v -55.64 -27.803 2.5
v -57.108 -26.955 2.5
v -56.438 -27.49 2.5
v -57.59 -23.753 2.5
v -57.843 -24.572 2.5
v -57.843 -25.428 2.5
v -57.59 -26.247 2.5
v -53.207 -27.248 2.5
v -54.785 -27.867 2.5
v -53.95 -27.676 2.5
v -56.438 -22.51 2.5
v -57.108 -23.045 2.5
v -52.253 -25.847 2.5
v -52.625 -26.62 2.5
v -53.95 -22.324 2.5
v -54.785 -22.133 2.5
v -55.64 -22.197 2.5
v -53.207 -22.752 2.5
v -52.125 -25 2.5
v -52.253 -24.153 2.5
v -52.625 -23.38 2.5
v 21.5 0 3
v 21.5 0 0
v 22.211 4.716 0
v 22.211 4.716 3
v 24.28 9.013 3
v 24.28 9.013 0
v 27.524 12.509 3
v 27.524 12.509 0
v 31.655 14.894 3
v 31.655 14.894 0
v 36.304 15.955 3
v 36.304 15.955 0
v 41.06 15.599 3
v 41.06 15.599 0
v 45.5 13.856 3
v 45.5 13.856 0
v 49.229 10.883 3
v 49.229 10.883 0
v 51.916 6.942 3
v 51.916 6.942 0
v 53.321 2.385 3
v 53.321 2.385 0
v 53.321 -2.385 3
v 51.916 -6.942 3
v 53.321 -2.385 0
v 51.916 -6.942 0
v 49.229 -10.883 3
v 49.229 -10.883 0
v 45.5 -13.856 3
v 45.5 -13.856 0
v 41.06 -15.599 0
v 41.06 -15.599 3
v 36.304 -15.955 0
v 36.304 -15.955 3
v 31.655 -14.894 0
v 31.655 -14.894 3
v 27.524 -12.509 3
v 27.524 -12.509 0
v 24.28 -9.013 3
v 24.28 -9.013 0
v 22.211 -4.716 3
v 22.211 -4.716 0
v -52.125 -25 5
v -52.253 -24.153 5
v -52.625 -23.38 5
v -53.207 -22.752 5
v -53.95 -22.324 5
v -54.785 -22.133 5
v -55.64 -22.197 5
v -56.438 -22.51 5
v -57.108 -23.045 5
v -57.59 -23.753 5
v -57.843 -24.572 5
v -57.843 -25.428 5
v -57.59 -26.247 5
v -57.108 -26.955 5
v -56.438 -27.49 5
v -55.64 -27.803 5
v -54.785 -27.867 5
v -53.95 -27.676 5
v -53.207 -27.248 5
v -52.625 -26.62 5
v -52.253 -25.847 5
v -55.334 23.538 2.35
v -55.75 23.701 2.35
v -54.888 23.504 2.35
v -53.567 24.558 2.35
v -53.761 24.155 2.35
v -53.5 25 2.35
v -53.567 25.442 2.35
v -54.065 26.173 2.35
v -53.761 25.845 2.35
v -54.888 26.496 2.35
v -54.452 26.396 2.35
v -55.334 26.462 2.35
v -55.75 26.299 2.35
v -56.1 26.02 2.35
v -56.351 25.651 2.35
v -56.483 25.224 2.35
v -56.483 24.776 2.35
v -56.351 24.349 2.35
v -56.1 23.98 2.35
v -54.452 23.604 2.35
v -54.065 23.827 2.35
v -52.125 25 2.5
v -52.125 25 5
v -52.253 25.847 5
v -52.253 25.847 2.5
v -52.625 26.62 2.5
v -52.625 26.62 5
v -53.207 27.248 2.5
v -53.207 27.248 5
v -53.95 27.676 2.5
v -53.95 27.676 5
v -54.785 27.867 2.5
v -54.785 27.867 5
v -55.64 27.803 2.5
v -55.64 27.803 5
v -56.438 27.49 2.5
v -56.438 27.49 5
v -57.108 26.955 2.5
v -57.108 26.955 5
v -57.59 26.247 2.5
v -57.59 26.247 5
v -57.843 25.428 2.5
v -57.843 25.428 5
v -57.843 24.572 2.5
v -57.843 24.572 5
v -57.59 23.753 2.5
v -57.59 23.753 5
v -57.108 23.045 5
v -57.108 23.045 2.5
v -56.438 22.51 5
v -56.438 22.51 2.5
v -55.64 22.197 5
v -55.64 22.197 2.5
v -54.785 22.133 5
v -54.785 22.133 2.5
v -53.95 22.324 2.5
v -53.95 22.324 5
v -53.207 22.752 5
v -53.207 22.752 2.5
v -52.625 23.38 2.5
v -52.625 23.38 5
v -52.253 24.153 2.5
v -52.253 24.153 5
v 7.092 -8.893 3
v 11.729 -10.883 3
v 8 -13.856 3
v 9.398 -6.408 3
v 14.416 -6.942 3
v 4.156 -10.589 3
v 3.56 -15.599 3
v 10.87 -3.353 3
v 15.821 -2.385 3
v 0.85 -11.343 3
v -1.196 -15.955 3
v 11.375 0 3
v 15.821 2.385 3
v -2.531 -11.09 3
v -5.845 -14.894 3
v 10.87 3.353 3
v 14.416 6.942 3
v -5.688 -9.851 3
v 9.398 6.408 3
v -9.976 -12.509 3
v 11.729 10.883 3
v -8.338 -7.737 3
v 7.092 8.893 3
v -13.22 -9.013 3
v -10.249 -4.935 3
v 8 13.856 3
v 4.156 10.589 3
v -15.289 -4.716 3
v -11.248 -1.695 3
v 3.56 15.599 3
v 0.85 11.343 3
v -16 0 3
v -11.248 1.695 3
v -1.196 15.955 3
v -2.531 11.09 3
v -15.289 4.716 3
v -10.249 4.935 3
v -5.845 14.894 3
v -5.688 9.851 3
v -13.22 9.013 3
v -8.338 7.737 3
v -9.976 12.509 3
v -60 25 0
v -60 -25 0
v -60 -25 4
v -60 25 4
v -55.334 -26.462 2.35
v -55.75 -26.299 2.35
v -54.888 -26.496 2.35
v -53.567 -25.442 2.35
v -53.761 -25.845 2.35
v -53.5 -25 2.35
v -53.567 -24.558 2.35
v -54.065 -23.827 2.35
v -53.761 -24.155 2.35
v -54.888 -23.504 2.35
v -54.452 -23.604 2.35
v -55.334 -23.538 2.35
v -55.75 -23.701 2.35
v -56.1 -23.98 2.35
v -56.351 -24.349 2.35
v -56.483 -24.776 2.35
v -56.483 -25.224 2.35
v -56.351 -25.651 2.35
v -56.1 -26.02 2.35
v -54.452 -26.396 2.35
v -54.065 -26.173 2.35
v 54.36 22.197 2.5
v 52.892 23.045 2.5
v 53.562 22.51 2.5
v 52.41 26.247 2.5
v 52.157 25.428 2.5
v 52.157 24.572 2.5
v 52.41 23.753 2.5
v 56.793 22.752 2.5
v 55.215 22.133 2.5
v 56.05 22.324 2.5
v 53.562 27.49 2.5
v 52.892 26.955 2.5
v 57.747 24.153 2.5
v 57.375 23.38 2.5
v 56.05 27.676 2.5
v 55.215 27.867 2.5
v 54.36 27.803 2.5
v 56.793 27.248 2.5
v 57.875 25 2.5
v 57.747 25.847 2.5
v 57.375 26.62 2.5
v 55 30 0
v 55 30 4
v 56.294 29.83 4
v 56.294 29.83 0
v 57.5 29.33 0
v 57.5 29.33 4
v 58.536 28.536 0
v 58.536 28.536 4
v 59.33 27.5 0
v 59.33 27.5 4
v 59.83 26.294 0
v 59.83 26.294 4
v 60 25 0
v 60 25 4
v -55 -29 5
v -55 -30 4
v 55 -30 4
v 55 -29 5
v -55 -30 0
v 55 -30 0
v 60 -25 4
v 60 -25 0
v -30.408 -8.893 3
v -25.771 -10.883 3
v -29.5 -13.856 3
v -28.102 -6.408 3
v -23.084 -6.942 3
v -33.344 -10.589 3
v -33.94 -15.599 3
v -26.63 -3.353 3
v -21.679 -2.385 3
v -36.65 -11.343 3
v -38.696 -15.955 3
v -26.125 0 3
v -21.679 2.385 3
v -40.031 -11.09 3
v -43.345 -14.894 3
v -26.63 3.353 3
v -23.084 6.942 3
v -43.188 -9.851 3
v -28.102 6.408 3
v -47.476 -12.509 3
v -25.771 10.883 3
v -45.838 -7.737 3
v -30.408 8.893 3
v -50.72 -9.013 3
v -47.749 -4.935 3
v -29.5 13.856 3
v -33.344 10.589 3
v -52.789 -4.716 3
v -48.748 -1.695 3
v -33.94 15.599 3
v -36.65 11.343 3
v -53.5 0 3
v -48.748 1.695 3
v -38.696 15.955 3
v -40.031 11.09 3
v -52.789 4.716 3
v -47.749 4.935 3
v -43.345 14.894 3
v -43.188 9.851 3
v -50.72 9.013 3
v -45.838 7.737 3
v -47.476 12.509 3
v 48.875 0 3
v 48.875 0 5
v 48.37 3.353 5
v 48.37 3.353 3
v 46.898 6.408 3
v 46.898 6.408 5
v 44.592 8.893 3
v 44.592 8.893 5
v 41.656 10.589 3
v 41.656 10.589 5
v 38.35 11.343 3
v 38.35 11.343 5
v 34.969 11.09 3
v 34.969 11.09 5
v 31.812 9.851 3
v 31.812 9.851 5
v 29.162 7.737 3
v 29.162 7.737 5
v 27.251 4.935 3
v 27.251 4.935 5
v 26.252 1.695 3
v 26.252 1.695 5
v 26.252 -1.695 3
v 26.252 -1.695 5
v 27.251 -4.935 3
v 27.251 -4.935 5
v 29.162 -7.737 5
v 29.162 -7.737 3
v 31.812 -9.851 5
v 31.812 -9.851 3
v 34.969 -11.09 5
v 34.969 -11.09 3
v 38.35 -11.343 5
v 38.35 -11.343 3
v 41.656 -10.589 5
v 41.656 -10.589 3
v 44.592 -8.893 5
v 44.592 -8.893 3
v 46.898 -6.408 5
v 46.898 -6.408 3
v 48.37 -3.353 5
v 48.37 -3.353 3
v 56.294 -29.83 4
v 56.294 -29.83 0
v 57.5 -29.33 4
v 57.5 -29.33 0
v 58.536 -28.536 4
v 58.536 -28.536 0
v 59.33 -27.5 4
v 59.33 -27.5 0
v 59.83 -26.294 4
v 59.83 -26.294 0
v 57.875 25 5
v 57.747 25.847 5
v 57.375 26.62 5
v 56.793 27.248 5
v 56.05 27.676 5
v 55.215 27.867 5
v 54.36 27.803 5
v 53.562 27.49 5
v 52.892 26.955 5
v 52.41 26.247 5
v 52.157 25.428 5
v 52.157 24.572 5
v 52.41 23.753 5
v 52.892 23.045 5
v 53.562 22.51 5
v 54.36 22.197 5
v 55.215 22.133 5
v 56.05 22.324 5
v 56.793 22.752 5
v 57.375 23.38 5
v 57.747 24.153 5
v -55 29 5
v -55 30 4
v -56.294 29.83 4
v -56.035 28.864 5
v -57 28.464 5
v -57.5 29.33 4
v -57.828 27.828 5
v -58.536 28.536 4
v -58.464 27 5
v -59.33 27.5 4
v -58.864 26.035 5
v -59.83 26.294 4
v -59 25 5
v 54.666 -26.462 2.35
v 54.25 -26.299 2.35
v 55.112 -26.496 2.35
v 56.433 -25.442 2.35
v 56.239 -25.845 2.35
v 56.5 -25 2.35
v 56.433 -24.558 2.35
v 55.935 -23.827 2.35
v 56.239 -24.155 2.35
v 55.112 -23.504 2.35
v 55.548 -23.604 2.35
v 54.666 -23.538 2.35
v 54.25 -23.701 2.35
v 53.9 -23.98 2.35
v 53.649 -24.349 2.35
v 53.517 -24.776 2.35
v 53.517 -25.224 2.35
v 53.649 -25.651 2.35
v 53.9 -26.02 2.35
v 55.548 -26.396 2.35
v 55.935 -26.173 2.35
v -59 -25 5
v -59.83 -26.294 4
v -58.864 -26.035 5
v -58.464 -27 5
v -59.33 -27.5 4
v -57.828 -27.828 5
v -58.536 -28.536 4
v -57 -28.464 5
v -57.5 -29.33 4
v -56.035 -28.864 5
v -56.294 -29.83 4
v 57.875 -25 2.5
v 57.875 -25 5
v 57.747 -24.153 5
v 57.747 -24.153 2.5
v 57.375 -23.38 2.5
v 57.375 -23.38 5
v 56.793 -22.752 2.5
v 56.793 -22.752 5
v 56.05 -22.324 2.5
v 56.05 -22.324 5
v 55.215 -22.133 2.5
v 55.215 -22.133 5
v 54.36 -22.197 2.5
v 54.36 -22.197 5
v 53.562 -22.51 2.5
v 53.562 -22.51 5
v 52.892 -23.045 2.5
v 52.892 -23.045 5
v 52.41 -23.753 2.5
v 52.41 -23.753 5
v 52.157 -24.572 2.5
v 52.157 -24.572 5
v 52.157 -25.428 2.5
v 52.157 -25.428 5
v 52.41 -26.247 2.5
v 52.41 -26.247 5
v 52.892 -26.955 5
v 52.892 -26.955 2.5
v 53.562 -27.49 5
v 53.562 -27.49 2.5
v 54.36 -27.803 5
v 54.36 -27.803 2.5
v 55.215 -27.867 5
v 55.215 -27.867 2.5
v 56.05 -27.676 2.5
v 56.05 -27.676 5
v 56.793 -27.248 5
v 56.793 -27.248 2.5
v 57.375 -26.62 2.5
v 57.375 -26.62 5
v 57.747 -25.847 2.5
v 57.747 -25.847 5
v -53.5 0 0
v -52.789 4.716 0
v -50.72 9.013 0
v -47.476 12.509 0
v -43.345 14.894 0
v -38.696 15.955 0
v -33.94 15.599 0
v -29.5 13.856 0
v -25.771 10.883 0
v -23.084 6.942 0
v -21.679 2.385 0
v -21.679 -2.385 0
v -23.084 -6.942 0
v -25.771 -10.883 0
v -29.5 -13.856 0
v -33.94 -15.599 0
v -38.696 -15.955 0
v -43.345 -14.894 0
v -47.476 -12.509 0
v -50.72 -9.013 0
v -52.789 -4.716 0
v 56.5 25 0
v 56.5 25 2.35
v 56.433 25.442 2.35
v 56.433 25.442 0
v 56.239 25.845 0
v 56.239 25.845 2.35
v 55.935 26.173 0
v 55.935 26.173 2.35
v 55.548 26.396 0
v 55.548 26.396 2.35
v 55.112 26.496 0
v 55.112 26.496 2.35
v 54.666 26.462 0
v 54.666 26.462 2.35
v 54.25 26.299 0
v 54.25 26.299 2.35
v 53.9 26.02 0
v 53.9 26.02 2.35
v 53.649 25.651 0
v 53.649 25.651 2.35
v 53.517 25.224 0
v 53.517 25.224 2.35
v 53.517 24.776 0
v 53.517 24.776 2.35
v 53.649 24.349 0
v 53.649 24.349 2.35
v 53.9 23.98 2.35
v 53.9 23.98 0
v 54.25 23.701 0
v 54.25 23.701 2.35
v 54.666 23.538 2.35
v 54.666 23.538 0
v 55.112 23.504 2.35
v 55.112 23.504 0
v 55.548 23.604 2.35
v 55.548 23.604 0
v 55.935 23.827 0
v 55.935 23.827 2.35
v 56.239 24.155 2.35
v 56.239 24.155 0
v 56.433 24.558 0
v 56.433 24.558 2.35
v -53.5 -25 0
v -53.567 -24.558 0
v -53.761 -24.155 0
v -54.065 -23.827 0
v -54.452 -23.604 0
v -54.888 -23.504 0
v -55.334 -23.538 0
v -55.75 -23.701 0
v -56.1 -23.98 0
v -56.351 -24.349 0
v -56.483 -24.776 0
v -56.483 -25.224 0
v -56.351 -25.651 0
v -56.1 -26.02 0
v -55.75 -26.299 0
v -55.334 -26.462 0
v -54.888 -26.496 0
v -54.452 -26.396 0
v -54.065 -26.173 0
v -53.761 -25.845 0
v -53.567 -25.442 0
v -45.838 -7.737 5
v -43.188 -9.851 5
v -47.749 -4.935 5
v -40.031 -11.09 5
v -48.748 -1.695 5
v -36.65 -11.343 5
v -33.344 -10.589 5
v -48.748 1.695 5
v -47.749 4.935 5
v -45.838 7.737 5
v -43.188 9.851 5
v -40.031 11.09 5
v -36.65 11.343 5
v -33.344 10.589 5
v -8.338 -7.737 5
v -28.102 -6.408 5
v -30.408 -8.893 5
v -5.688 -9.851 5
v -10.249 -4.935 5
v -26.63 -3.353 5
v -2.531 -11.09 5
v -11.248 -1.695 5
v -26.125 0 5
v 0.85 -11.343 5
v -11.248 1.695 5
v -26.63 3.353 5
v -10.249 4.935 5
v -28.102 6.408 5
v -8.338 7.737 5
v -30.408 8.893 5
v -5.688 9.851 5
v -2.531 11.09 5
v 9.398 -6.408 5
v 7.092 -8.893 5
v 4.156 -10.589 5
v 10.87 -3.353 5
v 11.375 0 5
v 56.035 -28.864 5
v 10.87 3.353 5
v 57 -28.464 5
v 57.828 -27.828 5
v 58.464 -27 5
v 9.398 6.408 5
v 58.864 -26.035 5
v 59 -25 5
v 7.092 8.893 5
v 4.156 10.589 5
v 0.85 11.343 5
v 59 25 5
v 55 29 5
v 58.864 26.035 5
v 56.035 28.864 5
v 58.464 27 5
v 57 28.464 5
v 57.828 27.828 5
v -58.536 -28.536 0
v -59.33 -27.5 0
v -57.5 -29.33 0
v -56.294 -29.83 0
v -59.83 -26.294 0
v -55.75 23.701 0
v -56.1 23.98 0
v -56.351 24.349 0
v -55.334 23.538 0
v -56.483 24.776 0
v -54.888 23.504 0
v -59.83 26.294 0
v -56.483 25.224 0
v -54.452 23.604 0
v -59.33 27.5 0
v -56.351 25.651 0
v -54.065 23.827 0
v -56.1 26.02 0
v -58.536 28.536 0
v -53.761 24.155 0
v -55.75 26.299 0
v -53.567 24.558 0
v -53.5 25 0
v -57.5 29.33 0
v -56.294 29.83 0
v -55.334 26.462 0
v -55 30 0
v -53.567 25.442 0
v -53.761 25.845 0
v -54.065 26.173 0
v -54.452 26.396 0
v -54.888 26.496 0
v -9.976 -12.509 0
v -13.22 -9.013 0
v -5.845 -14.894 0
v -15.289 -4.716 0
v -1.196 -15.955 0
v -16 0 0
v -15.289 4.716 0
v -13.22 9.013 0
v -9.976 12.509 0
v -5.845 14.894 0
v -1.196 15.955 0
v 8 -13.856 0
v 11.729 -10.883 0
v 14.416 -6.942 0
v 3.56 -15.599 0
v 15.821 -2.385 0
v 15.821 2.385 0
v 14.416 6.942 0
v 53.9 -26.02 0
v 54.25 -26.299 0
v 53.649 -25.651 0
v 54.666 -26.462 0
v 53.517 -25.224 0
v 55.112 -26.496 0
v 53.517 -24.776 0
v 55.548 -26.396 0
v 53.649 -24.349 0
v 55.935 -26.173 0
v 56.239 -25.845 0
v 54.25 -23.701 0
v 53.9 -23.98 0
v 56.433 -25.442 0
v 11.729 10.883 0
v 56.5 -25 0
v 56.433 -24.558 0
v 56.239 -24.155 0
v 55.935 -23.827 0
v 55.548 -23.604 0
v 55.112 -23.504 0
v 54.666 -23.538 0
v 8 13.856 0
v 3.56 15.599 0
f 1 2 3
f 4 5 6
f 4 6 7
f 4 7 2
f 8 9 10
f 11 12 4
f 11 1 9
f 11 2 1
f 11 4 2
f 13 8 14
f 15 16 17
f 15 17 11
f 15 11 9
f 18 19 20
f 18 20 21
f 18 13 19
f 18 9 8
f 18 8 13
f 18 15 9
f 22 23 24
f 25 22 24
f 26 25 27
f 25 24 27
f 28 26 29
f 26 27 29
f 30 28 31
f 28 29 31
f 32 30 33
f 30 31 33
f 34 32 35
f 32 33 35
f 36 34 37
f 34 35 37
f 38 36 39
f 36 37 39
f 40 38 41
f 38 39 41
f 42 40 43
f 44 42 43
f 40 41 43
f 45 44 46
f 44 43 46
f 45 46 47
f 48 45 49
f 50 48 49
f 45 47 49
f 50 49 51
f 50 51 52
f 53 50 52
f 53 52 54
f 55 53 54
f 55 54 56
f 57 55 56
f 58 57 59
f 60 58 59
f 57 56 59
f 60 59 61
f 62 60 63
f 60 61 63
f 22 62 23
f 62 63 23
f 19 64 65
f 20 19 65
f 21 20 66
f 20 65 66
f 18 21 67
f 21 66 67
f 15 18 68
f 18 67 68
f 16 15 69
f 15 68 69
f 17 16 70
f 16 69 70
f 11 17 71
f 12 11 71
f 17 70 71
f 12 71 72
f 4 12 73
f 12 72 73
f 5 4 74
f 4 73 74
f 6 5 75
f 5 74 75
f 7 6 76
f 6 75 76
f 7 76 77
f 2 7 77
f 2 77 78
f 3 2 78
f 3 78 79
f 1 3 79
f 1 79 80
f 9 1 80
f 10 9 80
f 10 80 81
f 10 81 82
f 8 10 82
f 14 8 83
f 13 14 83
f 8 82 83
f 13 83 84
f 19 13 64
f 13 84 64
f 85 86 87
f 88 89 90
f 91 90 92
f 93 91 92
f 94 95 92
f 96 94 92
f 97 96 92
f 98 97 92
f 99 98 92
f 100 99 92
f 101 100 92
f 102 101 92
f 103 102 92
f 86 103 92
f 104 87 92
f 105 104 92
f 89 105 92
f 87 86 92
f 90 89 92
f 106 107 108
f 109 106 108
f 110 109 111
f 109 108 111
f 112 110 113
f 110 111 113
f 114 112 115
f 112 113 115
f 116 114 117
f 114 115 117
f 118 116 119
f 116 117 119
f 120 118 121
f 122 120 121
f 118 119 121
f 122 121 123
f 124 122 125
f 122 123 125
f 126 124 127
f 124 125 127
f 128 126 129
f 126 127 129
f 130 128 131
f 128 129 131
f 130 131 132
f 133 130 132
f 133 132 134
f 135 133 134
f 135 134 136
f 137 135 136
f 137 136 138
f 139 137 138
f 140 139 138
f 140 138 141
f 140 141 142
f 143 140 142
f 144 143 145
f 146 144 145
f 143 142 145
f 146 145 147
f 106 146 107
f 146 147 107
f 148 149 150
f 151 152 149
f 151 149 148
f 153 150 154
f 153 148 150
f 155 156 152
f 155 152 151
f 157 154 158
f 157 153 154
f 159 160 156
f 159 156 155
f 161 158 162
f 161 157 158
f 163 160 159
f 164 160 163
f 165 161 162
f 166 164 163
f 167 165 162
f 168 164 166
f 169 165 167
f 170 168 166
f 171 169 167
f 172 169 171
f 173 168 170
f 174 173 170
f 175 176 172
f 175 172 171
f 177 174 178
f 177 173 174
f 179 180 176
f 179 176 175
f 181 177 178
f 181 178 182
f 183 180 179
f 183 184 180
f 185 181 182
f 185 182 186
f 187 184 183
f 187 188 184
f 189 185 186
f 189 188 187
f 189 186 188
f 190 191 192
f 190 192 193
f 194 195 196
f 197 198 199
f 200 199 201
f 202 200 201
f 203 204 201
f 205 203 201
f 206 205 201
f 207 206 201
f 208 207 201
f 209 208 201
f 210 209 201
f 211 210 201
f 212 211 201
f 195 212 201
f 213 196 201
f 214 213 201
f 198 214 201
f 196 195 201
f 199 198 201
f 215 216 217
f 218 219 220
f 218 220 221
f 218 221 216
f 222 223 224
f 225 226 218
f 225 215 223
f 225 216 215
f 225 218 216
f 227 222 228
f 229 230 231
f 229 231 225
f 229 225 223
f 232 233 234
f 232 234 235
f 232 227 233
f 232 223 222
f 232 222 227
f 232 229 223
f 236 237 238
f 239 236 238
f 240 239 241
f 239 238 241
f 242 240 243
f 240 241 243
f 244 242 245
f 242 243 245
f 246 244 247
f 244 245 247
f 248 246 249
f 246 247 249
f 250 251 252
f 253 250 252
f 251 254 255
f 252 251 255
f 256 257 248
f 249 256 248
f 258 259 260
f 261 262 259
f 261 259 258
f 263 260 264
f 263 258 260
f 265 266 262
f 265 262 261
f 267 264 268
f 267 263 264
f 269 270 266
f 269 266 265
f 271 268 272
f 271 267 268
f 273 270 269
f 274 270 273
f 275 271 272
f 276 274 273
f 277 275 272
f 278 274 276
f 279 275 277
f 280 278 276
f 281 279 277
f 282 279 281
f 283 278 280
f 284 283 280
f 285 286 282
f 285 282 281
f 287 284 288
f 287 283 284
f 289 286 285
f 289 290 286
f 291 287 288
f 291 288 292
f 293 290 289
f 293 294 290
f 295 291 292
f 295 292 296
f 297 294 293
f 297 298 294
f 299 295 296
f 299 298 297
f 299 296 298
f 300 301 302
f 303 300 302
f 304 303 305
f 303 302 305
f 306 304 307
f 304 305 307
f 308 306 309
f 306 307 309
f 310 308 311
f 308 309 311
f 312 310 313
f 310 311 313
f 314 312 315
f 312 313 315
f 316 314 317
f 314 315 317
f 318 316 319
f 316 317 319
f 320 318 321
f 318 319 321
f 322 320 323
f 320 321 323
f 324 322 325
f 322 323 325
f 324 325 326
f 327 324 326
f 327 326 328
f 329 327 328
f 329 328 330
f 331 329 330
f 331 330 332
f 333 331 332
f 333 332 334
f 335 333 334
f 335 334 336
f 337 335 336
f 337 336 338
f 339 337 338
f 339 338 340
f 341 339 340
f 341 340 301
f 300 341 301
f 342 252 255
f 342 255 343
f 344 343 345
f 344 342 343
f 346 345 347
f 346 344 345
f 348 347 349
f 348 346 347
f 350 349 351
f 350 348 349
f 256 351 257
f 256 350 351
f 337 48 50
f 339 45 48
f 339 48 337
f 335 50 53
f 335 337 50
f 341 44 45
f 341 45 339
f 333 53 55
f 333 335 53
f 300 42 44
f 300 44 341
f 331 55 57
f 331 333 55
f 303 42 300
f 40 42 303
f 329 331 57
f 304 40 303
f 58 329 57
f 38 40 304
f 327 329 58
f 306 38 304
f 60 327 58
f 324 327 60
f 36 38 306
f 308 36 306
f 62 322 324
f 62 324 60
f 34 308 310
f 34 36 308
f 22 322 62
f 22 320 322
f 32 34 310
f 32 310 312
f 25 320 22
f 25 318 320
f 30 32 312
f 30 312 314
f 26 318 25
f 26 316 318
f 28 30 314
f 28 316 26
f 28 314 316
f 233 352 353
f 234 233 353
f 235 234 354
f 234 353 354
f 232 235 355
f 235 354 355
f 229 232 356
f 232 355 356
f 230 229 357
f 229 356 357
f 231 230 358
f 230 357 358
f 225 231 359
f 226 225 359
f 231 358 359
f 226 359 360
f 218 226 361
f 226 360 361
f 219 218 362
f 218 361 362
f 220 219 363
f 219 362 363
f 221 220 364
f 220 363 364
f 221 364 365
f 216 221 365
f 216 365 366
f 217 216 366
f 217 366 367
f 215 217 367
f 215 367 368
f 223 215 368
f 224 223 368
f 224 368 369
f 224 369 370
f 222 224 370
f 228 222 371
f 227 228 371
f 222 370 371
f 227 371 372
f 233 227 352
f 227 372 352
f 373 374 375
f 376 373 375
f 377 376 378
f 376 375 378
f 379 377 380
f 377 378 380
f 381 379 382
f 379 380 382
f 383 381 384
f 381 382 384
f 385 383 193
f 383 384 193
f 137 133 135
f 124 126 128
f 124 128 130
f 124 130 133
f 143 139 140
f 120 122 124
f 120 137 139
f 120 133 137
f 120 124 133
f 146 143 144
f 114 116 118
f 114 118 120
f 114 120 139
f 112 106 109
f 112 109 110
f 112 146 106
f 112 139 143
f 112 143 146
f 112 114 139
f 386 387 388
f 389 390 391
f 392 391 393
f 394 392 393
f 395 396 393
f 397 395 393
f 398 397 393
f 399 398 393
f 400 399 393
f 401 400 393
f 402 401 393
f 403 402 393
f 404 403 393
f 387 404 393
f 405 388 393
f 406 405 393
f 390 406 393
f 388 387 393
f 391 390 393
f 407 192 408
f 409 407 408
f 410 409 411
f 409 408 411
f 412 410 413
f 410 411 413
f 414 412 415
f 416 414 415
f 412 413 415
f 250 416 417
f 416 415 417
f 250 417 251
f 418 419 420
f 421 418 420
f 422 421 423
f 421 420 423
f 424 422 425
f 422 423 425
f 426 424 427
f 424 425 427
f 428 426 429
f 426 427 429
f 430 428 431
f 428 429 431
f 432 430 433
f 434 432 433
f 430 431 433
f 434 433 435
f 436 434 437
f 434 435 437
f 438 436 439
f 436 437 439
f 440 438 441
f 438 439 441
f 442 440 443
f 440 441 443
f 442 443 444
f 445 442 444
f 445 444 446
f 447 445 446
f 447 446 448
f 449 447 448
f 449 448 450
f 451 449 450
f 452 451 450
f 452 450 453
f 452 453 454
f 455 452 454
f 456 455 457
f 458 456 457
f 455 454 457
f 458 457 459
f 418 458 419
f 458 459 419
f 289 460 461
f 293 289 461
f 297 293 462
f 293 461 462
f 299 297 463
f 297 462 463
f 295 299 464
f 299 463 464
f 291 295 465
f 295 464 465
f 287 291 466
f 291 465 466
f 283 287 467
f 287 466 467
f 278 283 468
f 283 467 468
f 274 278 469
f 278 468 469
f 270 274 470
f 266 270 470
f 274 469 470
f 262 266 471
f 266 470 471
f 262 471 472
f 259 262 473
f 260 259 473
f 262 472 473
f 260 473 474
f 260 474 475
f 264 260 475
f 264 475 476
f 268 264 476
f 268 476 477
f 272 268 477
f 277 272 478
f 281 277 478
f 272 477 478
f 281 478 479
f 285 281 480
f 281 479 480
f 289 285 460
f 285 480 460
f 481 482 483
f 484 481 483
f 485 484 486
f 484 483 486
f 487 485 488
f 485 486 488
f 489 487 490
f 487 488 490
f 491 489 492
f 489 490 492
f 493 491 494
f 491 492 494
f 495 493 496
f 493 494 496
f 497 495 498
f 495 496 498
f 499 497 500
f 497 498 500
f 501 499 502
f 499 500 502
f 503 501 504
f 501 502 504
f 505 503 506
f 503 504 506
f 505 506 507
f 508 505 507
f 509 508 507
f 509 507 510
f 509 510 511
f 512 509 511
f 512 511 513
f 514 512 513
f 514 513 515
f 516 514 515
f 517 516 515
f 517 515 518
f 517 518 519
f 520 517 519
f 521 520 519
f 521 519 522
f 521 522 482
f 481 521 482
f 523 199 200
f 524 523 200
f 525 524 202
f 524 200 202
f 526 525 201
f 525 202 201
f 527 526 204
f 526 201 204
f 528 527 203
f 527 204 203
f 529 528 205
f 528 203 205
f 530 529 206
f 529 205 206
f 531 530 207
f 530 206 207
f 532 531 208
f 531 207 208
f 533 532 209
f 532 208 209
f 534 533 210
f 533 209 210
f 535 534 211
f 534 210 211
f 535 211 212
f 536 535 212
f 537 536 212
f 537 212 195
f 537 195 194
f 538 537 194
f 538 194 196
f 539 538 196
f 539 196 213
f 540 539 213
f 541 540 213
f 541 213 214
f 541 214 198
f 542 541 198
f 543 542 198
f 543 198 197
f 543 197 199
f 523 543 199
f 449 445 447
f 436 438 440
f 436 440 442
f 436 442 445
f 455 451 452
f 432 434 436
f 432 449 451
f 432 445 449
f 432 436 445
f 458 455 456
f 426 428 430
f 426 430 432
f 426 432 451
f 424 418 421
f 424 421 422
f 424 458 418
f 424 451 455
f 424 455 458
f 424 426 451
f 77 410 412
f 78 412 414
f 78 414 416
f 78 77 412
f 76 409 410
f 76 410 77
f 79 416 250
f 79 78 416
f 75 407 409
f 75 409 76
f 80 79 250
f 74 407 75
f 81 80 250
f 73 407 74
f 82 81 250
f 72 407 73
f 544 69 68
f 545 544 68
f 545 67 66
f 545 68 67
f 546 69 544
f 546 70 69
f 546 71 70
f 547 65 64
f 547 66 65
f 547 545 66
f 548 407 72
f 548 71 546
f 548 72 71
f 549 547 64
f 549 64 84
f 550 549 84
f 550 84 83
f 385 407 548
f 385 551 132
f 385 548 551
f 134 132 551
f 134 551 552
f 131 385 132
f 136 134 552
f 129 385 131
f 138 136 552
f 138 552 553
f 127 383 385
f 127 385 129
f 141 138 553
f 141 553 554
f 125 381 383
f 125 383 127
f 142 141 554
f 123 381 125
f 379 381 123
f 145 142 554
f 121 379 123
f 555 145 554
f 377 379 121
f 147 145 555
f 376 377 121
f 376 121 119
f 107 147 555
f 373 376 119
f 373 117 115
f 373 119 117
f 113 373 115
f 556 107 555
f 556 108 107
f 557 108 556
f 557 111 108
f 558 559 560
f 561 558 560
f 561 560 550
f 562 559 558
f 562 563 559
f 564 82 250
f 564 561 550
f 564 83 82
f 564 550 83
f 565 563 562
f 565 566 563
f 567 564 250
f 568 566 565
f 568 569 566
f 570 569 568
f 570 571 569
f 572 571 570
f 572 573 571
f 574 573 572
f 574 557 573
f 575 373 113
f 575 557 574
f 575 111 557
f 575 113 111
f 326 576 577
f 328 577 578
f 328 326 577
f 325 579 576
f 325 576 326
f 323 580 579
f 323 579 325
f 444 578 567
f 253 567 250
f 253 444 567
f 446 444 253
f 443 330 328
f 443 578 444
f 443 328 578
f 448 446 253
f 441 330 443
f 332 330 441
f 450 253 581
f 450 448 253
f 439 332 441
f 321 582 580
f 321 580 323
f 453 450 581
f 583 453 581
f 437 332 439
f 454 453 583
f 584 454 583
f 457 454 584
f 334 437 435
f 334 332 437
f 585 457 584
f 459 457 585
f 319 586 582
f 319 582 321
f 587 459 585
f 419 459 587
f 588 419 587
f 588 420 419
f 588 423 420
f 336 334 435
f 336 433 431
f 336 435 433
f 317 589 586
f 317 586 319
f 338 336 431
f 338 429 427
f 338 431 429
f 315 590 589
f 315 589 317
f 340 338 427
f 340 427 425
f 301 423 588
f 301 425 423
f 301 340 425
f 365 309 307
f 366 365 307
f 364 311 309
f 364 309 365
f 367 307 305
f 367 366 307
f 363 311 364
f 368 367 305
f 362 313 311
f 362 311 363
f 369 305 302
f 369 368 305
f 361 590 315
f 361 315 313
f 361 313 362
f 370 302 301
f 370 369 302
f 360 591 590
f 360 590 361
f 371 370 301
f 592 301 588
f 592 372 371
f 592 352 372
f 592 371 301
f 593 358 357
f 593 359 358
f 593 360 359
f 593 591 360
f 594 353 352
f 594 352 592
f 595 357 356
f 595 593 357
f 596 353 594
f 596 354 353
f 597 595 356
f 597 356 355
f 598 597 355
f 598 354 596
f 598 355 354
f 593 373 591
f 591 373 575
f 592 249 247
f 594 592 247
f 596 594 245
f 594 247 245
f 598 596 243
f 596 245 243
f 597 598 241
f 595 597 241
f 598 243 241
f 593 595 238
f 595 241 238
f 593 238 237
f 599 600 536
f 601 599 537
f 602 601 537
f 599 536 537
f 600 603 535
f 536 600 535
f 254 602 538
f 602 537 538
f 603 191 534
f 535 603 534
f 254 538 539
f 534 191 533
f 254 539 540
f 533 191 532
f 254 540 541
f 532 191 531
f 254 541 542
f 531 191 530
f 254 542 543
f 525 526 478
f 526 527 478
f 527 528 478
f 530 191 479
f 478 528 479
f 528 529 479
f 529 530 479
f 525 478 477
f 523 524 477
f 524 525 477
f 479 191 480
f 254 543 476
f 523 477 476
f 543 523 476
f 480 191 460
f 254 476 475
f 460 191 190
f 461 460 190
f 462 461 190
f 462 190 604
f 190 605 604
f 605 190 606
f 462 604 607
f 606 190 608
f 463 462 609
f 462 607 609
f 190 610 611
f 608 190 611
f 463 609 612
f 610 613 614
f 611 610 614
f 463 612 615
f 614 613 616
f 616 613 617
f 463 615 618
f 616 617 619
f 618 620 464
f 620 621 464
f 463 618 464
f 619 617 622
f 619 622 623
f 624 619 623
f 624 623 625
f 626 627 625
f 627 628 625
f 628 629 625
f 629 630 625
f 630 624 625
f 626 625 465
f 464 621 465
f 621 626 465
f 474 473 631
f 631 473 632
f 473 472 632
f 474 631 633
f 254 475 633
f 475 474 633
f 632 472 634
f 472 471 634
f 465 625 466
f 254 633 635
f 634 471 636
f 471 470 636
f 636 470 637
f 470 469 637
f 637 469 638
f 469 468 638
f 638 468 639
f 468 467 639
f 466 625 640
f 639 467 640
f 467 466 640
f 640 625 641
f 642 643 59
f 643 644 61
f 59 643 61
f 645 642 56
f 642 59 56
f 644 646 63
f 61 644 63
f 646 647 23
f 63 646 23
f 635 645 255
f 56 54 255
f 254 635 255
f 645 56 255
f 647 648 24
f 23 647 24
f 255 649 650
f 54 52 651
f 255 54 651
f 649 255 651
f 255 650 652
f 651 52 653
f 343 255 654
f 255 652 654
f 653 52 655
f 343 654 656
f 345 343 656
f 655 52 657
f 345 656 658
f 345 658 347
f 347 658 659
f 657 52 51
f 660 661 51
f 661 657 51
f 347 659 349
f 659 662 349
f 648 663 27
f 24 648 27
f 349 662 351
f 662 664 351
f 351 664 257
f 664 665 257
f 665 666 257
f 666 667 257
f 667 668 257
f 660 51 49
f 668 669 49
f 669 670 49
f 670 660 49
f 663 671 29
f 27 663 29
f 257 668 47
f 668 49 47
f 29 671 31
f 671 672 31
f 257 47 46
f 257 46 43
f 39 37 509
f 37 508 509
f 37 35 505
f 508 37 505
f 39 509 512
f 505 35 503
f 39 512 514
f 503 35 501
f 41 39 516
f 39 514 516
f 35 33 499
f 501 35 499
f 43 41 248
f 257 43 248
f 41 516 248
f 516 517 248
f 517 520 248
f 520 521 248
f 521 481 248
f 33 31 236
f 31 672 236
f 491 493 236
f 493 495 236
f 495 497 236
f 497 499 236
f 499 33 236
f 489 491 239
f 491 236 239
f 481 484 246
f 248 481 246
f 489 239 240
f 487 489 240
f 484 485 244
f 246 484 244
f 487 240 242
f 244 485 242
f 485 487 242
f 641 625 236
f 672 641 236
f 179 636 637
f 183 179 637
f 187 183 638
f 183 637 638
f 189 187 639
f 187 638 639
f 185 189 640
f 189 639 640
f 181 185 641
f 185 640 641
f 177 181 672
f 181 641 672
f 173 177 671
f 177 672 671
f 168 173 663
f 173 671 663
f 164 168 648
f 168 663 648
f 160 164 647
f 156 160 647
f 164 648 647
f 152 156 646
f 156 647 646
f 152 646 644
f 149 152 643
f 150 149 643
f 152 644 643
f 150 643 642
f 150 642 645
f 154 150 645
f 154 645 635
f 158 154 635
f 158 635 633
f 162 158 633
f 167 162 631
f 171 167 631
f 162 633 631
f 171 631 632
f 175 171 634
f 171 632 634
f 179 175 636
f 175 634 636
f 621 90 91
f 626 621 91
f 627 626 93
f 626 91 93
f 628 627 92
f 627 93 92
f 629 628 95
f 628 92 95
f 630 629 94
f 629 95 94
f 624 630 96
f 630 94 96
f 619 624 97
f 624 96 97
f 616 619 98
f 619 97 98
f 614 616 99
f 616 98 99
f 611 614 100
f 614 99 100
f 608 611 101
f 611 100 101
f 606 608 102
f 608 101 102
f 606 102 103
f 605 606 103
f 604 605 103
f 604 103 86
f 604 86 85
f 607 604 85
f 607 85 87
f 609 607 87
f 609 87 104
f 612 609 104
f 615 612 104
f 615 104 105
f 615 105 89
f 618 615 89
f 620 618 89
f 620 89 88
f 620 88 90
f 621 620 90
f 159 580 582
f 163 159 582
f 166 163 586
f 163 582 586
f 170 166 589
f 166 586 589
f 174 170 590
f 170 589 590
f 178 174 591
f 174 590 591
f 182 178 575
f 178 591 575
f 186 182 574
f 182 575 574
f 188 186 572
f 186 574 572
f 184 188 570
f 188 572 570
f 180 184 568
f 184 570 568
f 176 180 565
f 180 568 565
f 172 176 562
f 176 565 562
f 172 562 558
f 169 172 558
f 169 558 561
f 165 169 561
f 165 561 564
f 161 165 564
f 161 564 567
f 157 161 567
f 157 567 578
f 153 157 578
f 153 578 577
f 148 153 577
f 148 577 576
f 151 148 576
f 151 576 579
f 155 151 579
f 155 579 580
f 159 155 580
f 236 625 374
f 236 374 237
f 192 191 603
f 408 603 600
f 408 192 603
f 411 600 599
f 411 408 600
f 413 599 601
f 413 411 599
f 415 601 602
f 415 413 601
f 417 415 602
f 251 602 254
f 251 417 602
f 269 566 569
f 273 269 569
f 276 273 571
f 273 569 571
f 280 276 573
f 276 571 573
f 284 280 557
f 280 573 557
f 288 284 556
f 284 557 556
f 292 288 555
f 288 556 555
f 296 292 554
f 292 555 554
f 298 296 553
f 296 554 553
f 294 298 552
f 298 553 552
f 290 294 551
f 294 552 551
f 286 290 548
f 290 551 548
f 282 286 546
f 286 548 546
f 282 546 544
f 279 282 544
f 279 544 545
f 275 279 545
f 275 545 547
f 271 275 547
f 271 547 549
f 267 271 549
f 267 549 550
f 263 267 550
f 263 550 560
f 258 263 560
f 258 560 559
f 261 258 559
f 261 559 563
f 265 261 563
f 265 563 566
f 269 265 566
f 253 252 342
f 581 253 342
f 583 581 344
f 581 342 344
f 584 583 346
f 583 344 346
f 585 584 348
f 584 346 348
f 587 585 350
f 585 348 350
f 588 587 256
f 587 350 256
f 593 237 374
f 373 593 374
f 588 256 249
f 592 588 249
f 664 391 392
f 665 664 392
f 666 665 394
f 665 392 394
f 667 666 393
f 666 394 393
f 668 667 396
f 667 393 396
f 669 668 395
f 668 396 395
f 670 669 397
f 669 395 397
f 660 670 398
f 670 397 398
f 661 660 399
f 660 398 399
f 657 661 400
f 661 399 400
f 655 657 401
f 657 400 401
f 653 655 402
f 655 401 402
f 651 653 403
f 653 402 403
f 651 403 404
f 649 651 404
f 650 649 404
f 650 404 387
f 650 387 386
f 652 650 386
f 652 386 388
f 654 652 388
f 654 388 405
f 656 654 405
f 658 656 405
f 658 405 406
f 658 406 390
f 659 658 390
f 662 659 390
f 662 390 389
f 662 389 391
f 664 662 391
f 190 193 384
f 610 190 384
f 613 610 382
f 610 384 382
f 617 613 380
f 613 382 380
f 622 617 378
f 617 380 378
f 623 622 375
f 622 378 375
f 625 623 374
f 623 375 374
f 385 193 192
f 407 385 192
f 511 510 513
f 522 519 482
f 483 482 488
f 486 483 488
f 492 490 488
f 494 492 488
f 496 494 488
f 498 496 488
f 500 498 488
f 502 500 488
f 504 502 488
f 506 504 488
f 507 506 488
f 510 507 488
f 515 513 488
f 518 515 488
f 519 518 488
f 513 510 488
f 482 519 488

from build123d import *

# Parameters (mm, degrees)
SKETCH1_W           = 120
SKETCH1_H           = 60
BOSS_EXTRUDE1_DEPTH = 5
SKETCH2_R           = 11.375
CUT_EXTRUDE1_DEPTH  = 68.268120235
FILLET1_R           = 5
SKETCH3_R           = 1.5
CUT_EXTRUDE2_DEPTH  = 68.268120235
SKETCH4_R           = 2.875
CUT_EXTRUDE3_DEPTH  = 2.5
CHAMFER1_SIZE       = 1
SKETCH5_R           = 16
CUT_EXTRUDE4_DEPTH  = 3
SKETCH6_R           = 2.5
BOSS_EXTRUDE2_DEPTH = 0.15


with BuildPart() as part:
    # Sketch1 → Boss-Extrude1 (new body)
    with BuildSketch(Plane.XY):
        Rectangle(SKETCH1_W, SKETCH1_H)
    extrude(amount=BOSS_EXTRUDE1_DEPTH)

    # Sketch2 → Cut-Extrude1 (cut, through all)
    with BuildSketch(Plane.XY.offset(5)):
        Circle(SKETCH2_R)
        with Locations((37.5, 0)):
            Circle(SKETCH2_R)
        with Locations((-37.5, 0)):
            Circle(SKETCH2_R)
    extrude(amount=-CUT_EXTRUDE1_DEPTH, mode=Mode.SUBTRACT)

    # Fillet1
    fillet1_edges = [part.edges().sort_by_distance(p)[0] for p in [
        (60, -30, 2.5),
        (-60, -30, 2.5),
        (-60, 30, 2.5),
        (60, 30, 2.5),
    ]]
    fillet(fillet1_edges, radius=FILLET1_R)

    # Sketch3 → Cut-Extrude2 (cut, through all)
    with BuildSketch(Plane.XY.offset(5)):
        with Locations((-55, 25)):
            Circle(SKETCH3_R)
        with Locations((55, 25)):
            Circle(SKETCH3_R)
        with Locations((55, -25)):
            Circle(SKETCH3_R)
        with Locations((-55, -25)):
            Circle(SKETCH3_R)
    extrude(amount=-CUT_EXTRUDE2_DEPTH, mode=Mode.SUBTRACT)

    # Sketch4 → Cut-Extrude3 (cut)
    with BuildSketch(Plane.XY.offset(5)):
        with Locations((-55, 25)):
            Circle(SKETCH4_R)
        with Locations((55, 25)):
            Circle(SKETCH4_R)
        with Locations((55, -25)):
            Circle(SKETCH4_R)
        with Locations((-55, -25)):
            Circle(SKETCH4_R)
    extrude(amount=-CUT_EXTRUDE3_DEPTH, mode=Mode.SUBTRACT)

    # Chamfer1
    chamfer1_edges = [part.edges().sort_by_distance(p)[0] for p in [
        (0, -30, 5),
        (-60, 0, 5),
        (60, 0, 5),
        (0, 30, 5),
        (-58.535533906, 28.535533906, 5),
        (58.535533906, 28.535533906, 5),
        (58.535533906, -28.535533906, 5),
        (-58.535533906, -28.535533906, 5),
    ]]
    chamfer(chamfer1_edges, length=CHAMFER1_SIZE)

    # Sketch5 → Cut-Extrude4 (cut)
    with BuildSketch(Plane(origin=(0, 0, 0), x_dir=(-1, 0, 0), z_dir=(0, 0, -1))):
        with Locations((-37.5, 0)):
            Circle(SKETCH5_R)
        Circle(SKETCH5_R)
        with Locations((37.5, 0)):
            Circle(SKETCH5_R)
    extrude(amount=-CUT_EXTRUDE4_DEPTH, mode=Mode.SUBTRACT)

    # Sketch6 → Boss-Extrude2 (add)
    with BuildSketch(Plane.XY.offset(2.5)):
        with Locations((-55, 25)):
            Circle(SKETCH6_R)
        with Locations((55, 25)):
            Circle(SKETCH6_R)
        with Locations((55, -25)):
            Circle(SKETCH6_R)
        with Locations((-55, -25)):
            Circle(SKETCH6_R)
    extrude(amount=-BOSS_EXTRUDE2_DEPTH)


solid = part.part
